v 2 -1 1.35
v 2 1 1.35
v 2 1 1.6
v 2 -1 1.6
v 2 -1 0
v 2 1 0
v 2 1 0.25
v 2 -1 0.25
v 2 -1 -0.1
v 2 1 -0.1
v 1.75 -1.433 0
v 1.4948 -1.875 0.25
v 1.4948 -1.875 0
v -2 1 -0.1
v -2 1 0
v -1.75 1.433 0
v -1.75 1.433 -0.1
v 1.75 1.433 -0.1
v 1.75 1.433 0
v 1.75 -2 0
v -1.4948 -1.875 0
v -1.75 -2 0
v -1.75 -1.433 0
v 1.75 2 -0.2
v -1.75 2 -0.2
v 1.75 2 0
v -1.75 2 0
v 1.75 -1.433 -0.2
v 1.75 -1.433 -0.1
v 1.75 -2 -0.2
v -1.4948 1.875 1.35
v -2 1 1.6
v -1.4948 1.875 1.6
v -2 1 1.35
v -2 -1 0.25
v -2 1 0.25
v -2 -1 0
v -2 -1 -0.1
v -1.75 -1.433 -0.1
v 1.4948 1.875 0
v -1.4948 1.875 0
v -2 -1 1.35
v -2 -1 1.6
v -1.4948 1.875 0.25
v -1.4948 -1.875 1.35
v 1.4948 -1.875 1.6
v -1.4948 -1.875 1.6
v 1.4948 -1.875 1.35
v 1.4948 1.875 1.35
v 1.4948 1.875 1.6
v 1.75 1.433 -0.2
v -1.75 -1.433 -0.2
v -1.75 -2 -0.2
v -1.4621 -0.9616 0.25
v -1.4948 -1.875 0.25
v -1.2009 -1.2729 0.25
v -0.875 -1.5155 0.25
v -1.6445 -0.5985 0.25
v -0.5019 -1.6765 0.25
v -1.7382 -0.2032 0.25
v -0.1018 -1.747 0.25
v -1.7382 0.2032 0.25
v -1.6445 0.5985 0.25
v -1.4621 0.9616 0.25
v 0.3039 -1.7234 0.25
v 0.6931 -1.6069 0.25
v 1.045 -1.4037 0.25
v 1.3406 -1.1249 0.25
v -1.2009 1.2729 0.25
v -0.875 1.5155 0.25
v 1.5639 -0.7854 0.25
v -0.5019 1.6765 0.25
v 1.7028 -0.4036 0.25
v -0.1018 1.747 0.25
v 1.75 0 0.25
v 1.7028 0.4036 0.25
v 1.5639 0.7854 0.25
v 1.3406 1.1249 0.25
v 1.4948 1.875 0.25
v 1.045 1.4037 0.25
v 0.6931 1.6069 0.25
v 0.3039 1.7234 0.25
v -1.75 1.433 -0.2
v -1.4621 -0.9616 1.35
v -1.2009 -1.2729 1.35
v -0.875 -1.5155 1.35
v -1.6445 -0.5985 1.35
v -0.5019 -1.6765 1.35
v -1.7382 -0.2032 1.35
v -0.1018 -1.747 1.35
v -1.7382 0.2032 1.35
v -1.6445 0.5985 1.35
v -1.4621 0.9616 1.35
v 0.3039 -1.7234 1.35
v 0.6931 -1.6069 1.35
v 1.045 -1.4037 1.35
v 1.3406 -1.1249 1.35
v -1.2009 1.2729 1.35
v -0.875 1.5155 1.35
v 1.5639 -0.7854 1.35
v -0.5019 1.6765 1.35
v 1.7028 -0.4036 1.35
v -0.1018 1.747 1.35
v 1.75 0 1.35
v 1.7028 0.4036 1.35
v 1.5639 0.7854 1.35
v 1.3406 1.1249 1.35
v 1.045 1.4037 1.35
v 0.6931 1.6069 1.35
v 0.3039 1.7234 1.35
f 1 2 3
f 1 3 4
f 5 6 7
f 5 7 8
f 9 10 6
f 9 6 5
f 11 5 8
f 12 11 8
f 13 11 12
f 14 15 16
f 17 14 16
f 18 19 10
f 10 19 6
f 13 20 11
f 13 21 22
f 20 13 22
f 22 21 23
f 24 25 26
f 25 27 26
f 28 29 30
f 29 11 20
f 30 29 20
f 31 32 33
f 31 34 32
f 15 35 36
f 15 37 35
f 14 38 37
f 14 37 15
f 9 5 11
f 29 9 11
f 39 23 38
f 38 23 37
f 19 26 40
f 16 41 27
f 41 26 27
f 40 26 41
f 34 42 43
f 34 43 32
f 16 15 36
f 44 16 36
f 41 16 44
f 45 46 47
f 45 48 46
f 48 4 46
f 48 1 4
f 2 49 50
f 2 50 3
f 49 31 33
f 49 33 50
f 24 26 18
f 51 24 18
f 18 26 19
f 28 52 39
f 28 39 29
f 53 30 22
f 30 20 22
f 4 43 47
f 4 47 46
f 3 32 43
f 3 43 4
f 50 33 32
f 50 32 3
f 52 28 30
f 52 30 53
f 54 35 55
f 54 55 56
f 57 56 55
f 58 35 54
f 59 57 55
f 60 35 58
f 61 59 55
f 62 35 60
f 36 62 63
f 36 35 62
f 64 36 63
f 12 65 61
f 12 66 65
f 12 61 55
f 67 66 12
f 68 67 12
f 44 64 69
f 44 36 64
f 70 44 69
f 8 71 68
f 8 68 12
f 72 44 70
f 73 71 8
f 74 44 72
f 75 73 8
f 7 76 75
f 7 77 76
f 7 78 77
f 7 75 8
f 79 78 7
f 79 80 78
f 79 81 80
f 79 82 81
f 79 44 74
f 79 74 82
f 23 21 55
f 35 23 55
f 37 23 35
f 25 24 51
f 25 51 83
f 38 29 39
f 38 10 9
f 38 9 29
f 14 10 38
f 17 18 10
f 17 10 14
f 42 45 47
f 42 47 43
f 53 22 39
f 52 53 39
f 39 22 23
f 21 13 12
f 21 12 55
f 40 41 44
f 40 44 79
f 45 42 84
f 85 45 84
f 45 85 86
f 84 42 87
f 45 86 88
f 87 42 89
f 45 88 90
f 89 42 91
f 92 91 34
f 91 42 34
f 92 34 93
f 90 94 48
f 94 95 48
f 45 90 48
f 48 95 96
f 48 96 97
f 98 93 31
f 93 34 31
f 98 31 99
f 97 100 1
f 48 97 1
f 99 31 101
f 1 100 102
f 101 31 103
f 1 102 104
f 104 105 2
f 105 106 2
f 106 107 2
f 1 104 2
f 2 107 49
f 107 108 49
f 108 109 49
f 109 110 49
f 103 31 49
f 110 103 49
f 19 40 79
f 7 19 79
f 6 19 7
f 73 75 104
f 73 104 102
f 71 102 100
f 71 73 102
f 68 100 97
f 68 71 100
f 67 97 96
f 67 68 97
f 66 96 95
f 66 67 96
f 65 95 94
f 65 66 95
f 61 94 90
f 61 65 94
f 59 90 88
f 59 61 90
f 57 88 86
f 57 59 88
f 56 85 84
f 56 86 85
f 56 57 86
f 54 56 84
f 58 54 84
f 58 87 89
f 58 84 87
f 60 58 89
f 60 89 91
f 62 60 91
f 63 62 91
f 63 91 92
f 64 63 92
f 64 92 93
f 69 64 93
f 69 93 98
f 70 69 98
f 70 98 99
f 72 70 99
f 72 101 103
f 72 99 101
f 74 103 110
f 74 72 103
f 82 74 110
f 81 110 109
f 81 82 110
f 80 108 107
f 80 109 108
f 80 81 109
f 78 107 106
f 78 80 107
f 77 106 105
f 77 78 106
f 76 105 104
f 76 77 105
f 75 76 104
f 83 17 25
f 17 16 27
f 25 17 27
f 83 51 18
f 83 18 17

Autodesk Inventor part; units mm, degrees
ref_plane "YZ Plane" through (0, 0, 0) normal (1, 0, 0) x (0, 1, 0)
ref_plane "XZ Plane" through (0, 0, 0) normal (0, 1, 0) x (-1, 0, 0)
ref_plane "XY Plane" through (0, 0, 0) normal (0, 0, 1) x (1, 0, 0)
sketch "Sketch1" plane through (0, 0, 0) normal (0, 0, 1) x (1, 0, 0)
  line L0 (1.75, -2) -> (-1.75, -2)
  line L1 (-1.75, -2) -> (-1.75, 2)
  line L2 (-1.75, 2) -> (1.75, 2)
  line L3 (1.75, 2) -> (1.75, -2)
  line L4 (1.75, -2) -> (-1.75, 2) construction
  line L5 (-1.75, -2) -> (1.75, 2) construction
  line L6 (-2, -1) -> (-2, 1)
  line L7 (-2, 1) -> (-1.4948, 1.875)
  line L8 (-1.4948, 1.875) -> (1.4948, 1.875)
  line L9 (1.4948, 1.875) -> (2, 1)
  line L10 (2, 1) -> (2, -1)
  line L11 (2, -1) -> (1.4948, -1.875)
  line L12 (1.4948, -1.875) -> (-1.4948, -1.875)
  line L13 (-1.4948, -1.875) -> (-2, -1)
  line L14 (-2, -1) -> (2, 1) construction
  line L15 (-2, 1) -> (2, -1) construction
  point P0 (0, 0)
  point P1 (0, 0)
  dimension "d0" = 3.5
  dimension "d1" = 4
  dimension "d2" = 4
  dimension "d3" = 3.75
  dimension "d6" = 150
  dimension "d7" = 150
  dimension "d8" = 2
extrude "Extrusion1" add sketch "Sketch1" along normal blind 1.6 contours L11 L12 L13 L1 L7 L8 L9 L3 | L3 L9 L10 L11 | L13 L6 L7 L1
sketch "Sketch2" plane through (0, 0, 0) normal (0, 0, -1) x (-1, 0, 0)
  line L0 (2, -1) -> (2, 1) projected
  line L1 (2, 1) -> (1.4948, 1.875) projected
  line L2 (1.4948, 1.875) -> (-1.4948, 1.875) projected
  line L3 (-1.4948, 1.875) -> (-2, 1) projected
  line L4 (-2, 1) -> (-2, -1) projected
  line L5 (-2, -1) -> (-1.4948, -1.875) projected
  line L6 (-1.4948, -1.875) -> (1.4948, -1.875) projected
  line L7 (1.4948, -1.875) -> (2, -1) projected
  line L8 (-1.75, -2) -> (1.75, -2)
  line L9 (1.75, -2) -> (1.75, 2)
  line L10 (1.75, 2) -> (-1.75, 2)
  line L11 (-1.75, 2) -> (-1.75, -2)
  line L12 (-1.75, -2) -> (1.75, 2) construction
  line L13 (1.75, -2) -> (-1.75, 2) construction
  point P0 (0, 0)
  dimension "d11" = 3.5
  dimension "d12" = 4
extrude "Extrusion2" add sketch "Sketch2" along normal blind 0.2 contours L9 L8 L11 L5 L6 L7 | L7 L6 L5 L11 L3 L2 L1 L9 | L1 L2 L3 L11 L10 L9
sketch "Sketch3" plane through (0, 0, 0) normal (0, 0, -1) x (-1, 0, 0)
  line L0 (-1.75, -1.433) -> (-1.75, 1.433) projected
  line L1 (-1.75, 1.433) -> (-2, 1) projected
  line L2 (-2, 1) -> (-2, -1) projected
  line L3 (-2, -1) -> (-1.75, -1.433) projected
  line L4 (1.75, 1.433) -> (1.75, -1.433) projected
  line L5 (1.75, -1.433) -> (2, -1) projected
  line L6 (2, -1) -> (2, 1) projected
  line L7 (2, 1) -> (1.75, 1.433) projected
  point P0 (0, 0)
extrude "Extrusion3" add sketch "Sketch3" along normal up to surface (0.2 mm away)
sketch "Sketch4" plane through (0, 0, 0) normal (0, 1, 0) x (-1, 0, 0)
  line L0 (-2, 1.6) -> (-2, -0.2) projected
  line L1 (-1.4948, 1.6) -> (-2, 1.6) projected
  line L2 (-1.4948, 0) -> (-1.4948, 1.6) projected
  line L3 (-1.75, 0) -> (-1.4948, 0) projected
  line L4 (-1.75, -0.2) -> (-1.75, 0) projected
  line L5 (-1.75, -0.2) -> (-2, -0.2) projected
  line L6 (1.4948, 0) -> (1.75, 0) projected
  line L7 (1.4948, 0) -> (1.4948, 1.6) projected
  line L8 (2, 1.6) -> (1.4948, 1.6) projected
  line L9 (2, -0.2) -> (2, 1.6) projected
  line L10 (2, -0.2) -> (1.75, -0.2) projected
  line L11 (1.75, 0) -> (1.75, -0.2) projected
  line L12 (-3.75, 1.35) -> (-1.75, 1.35)
  line L13 (-1.75, 1.35) -> (-1.75, 0.25)
  line L14 (-1.75, 0.25) -> (-3.75, 0.25)
  line L15 (-3.75, 0.25) -> (-3.75, 1.35)
  line L16 (-1.75, -0.2) -> (1.75, -0.2) projected
  line L17 (0, -0.56) -> (0, 1.96) projected
  point P0 (0, 0)
  dimension "d18" = 0.25
  dimension "d19" = 0.25
  dimension "d21" = 2
  dimension "d22" = 0.25
revolve "Revolution1" cut sketch "Sketch4" angle 360 about axis through (0, 0, -10) along (0, 0, 1) contours L12 L13 L14 L0 | L0 L14 L15 L12
sketch "Sketch5" plane through (0, 0, -0.2) normal (0, 0, -1) x (-1, 0, 0)
  line L0 (-1.75, -2) -> (1.75, -2) projected
  line L1 (1.75, -2) -> (1.75, -1.433) projected
  line L2 (2, -1) -> (1.75, -1.433) projected
  line L3 (2, 1) -> (2, -1) projected
  line L4 (1.75, 1.433) -> (2, 1) projected
  line L5 (1.75, 1.433) -> (1.75, 2) projected
  line L6 (1.75, 2) -> (-1.75, 2) projected
  line L7 (-1.75, 2) -> (-1.75, 1.433) projected
  line L8 (-2, 1) -> (-1.75, 1.433) projected
  line L9 (-2, -1) -> (-2, 1) projected
  line L10 (-1.75, -1.433) -> (-2, -1) projected
  line L11 (-1.75, -1.433) -> (-1.75, -2) projected
  line L12 (2, -1.433) -> (-2, -1.433)
  line L13 (-2, -1.433) -> (-2, 1.433)
  line L14 (-2, 1.433) -> (2, 1.433)
  line L15 (2, 1.433) -> (2, -1.433)
  line L16 (2, -1.433) -> (-2, 1.433) construction
  line L17 (-2, -1.433) -> (2, 1.433) construction
  point P0 (0, 0)
extrude "Extrusion4" cut sketch "Sketch5" against normal blind 0.1 contours L12 L13 L10 | L10 L9 L8 L14 L4 L3 L2 L12 | L2 L15 L12 | L13 L14 L8 | L4 L14 L15
properties part number "SRN4018" material "ABS Plastic"
